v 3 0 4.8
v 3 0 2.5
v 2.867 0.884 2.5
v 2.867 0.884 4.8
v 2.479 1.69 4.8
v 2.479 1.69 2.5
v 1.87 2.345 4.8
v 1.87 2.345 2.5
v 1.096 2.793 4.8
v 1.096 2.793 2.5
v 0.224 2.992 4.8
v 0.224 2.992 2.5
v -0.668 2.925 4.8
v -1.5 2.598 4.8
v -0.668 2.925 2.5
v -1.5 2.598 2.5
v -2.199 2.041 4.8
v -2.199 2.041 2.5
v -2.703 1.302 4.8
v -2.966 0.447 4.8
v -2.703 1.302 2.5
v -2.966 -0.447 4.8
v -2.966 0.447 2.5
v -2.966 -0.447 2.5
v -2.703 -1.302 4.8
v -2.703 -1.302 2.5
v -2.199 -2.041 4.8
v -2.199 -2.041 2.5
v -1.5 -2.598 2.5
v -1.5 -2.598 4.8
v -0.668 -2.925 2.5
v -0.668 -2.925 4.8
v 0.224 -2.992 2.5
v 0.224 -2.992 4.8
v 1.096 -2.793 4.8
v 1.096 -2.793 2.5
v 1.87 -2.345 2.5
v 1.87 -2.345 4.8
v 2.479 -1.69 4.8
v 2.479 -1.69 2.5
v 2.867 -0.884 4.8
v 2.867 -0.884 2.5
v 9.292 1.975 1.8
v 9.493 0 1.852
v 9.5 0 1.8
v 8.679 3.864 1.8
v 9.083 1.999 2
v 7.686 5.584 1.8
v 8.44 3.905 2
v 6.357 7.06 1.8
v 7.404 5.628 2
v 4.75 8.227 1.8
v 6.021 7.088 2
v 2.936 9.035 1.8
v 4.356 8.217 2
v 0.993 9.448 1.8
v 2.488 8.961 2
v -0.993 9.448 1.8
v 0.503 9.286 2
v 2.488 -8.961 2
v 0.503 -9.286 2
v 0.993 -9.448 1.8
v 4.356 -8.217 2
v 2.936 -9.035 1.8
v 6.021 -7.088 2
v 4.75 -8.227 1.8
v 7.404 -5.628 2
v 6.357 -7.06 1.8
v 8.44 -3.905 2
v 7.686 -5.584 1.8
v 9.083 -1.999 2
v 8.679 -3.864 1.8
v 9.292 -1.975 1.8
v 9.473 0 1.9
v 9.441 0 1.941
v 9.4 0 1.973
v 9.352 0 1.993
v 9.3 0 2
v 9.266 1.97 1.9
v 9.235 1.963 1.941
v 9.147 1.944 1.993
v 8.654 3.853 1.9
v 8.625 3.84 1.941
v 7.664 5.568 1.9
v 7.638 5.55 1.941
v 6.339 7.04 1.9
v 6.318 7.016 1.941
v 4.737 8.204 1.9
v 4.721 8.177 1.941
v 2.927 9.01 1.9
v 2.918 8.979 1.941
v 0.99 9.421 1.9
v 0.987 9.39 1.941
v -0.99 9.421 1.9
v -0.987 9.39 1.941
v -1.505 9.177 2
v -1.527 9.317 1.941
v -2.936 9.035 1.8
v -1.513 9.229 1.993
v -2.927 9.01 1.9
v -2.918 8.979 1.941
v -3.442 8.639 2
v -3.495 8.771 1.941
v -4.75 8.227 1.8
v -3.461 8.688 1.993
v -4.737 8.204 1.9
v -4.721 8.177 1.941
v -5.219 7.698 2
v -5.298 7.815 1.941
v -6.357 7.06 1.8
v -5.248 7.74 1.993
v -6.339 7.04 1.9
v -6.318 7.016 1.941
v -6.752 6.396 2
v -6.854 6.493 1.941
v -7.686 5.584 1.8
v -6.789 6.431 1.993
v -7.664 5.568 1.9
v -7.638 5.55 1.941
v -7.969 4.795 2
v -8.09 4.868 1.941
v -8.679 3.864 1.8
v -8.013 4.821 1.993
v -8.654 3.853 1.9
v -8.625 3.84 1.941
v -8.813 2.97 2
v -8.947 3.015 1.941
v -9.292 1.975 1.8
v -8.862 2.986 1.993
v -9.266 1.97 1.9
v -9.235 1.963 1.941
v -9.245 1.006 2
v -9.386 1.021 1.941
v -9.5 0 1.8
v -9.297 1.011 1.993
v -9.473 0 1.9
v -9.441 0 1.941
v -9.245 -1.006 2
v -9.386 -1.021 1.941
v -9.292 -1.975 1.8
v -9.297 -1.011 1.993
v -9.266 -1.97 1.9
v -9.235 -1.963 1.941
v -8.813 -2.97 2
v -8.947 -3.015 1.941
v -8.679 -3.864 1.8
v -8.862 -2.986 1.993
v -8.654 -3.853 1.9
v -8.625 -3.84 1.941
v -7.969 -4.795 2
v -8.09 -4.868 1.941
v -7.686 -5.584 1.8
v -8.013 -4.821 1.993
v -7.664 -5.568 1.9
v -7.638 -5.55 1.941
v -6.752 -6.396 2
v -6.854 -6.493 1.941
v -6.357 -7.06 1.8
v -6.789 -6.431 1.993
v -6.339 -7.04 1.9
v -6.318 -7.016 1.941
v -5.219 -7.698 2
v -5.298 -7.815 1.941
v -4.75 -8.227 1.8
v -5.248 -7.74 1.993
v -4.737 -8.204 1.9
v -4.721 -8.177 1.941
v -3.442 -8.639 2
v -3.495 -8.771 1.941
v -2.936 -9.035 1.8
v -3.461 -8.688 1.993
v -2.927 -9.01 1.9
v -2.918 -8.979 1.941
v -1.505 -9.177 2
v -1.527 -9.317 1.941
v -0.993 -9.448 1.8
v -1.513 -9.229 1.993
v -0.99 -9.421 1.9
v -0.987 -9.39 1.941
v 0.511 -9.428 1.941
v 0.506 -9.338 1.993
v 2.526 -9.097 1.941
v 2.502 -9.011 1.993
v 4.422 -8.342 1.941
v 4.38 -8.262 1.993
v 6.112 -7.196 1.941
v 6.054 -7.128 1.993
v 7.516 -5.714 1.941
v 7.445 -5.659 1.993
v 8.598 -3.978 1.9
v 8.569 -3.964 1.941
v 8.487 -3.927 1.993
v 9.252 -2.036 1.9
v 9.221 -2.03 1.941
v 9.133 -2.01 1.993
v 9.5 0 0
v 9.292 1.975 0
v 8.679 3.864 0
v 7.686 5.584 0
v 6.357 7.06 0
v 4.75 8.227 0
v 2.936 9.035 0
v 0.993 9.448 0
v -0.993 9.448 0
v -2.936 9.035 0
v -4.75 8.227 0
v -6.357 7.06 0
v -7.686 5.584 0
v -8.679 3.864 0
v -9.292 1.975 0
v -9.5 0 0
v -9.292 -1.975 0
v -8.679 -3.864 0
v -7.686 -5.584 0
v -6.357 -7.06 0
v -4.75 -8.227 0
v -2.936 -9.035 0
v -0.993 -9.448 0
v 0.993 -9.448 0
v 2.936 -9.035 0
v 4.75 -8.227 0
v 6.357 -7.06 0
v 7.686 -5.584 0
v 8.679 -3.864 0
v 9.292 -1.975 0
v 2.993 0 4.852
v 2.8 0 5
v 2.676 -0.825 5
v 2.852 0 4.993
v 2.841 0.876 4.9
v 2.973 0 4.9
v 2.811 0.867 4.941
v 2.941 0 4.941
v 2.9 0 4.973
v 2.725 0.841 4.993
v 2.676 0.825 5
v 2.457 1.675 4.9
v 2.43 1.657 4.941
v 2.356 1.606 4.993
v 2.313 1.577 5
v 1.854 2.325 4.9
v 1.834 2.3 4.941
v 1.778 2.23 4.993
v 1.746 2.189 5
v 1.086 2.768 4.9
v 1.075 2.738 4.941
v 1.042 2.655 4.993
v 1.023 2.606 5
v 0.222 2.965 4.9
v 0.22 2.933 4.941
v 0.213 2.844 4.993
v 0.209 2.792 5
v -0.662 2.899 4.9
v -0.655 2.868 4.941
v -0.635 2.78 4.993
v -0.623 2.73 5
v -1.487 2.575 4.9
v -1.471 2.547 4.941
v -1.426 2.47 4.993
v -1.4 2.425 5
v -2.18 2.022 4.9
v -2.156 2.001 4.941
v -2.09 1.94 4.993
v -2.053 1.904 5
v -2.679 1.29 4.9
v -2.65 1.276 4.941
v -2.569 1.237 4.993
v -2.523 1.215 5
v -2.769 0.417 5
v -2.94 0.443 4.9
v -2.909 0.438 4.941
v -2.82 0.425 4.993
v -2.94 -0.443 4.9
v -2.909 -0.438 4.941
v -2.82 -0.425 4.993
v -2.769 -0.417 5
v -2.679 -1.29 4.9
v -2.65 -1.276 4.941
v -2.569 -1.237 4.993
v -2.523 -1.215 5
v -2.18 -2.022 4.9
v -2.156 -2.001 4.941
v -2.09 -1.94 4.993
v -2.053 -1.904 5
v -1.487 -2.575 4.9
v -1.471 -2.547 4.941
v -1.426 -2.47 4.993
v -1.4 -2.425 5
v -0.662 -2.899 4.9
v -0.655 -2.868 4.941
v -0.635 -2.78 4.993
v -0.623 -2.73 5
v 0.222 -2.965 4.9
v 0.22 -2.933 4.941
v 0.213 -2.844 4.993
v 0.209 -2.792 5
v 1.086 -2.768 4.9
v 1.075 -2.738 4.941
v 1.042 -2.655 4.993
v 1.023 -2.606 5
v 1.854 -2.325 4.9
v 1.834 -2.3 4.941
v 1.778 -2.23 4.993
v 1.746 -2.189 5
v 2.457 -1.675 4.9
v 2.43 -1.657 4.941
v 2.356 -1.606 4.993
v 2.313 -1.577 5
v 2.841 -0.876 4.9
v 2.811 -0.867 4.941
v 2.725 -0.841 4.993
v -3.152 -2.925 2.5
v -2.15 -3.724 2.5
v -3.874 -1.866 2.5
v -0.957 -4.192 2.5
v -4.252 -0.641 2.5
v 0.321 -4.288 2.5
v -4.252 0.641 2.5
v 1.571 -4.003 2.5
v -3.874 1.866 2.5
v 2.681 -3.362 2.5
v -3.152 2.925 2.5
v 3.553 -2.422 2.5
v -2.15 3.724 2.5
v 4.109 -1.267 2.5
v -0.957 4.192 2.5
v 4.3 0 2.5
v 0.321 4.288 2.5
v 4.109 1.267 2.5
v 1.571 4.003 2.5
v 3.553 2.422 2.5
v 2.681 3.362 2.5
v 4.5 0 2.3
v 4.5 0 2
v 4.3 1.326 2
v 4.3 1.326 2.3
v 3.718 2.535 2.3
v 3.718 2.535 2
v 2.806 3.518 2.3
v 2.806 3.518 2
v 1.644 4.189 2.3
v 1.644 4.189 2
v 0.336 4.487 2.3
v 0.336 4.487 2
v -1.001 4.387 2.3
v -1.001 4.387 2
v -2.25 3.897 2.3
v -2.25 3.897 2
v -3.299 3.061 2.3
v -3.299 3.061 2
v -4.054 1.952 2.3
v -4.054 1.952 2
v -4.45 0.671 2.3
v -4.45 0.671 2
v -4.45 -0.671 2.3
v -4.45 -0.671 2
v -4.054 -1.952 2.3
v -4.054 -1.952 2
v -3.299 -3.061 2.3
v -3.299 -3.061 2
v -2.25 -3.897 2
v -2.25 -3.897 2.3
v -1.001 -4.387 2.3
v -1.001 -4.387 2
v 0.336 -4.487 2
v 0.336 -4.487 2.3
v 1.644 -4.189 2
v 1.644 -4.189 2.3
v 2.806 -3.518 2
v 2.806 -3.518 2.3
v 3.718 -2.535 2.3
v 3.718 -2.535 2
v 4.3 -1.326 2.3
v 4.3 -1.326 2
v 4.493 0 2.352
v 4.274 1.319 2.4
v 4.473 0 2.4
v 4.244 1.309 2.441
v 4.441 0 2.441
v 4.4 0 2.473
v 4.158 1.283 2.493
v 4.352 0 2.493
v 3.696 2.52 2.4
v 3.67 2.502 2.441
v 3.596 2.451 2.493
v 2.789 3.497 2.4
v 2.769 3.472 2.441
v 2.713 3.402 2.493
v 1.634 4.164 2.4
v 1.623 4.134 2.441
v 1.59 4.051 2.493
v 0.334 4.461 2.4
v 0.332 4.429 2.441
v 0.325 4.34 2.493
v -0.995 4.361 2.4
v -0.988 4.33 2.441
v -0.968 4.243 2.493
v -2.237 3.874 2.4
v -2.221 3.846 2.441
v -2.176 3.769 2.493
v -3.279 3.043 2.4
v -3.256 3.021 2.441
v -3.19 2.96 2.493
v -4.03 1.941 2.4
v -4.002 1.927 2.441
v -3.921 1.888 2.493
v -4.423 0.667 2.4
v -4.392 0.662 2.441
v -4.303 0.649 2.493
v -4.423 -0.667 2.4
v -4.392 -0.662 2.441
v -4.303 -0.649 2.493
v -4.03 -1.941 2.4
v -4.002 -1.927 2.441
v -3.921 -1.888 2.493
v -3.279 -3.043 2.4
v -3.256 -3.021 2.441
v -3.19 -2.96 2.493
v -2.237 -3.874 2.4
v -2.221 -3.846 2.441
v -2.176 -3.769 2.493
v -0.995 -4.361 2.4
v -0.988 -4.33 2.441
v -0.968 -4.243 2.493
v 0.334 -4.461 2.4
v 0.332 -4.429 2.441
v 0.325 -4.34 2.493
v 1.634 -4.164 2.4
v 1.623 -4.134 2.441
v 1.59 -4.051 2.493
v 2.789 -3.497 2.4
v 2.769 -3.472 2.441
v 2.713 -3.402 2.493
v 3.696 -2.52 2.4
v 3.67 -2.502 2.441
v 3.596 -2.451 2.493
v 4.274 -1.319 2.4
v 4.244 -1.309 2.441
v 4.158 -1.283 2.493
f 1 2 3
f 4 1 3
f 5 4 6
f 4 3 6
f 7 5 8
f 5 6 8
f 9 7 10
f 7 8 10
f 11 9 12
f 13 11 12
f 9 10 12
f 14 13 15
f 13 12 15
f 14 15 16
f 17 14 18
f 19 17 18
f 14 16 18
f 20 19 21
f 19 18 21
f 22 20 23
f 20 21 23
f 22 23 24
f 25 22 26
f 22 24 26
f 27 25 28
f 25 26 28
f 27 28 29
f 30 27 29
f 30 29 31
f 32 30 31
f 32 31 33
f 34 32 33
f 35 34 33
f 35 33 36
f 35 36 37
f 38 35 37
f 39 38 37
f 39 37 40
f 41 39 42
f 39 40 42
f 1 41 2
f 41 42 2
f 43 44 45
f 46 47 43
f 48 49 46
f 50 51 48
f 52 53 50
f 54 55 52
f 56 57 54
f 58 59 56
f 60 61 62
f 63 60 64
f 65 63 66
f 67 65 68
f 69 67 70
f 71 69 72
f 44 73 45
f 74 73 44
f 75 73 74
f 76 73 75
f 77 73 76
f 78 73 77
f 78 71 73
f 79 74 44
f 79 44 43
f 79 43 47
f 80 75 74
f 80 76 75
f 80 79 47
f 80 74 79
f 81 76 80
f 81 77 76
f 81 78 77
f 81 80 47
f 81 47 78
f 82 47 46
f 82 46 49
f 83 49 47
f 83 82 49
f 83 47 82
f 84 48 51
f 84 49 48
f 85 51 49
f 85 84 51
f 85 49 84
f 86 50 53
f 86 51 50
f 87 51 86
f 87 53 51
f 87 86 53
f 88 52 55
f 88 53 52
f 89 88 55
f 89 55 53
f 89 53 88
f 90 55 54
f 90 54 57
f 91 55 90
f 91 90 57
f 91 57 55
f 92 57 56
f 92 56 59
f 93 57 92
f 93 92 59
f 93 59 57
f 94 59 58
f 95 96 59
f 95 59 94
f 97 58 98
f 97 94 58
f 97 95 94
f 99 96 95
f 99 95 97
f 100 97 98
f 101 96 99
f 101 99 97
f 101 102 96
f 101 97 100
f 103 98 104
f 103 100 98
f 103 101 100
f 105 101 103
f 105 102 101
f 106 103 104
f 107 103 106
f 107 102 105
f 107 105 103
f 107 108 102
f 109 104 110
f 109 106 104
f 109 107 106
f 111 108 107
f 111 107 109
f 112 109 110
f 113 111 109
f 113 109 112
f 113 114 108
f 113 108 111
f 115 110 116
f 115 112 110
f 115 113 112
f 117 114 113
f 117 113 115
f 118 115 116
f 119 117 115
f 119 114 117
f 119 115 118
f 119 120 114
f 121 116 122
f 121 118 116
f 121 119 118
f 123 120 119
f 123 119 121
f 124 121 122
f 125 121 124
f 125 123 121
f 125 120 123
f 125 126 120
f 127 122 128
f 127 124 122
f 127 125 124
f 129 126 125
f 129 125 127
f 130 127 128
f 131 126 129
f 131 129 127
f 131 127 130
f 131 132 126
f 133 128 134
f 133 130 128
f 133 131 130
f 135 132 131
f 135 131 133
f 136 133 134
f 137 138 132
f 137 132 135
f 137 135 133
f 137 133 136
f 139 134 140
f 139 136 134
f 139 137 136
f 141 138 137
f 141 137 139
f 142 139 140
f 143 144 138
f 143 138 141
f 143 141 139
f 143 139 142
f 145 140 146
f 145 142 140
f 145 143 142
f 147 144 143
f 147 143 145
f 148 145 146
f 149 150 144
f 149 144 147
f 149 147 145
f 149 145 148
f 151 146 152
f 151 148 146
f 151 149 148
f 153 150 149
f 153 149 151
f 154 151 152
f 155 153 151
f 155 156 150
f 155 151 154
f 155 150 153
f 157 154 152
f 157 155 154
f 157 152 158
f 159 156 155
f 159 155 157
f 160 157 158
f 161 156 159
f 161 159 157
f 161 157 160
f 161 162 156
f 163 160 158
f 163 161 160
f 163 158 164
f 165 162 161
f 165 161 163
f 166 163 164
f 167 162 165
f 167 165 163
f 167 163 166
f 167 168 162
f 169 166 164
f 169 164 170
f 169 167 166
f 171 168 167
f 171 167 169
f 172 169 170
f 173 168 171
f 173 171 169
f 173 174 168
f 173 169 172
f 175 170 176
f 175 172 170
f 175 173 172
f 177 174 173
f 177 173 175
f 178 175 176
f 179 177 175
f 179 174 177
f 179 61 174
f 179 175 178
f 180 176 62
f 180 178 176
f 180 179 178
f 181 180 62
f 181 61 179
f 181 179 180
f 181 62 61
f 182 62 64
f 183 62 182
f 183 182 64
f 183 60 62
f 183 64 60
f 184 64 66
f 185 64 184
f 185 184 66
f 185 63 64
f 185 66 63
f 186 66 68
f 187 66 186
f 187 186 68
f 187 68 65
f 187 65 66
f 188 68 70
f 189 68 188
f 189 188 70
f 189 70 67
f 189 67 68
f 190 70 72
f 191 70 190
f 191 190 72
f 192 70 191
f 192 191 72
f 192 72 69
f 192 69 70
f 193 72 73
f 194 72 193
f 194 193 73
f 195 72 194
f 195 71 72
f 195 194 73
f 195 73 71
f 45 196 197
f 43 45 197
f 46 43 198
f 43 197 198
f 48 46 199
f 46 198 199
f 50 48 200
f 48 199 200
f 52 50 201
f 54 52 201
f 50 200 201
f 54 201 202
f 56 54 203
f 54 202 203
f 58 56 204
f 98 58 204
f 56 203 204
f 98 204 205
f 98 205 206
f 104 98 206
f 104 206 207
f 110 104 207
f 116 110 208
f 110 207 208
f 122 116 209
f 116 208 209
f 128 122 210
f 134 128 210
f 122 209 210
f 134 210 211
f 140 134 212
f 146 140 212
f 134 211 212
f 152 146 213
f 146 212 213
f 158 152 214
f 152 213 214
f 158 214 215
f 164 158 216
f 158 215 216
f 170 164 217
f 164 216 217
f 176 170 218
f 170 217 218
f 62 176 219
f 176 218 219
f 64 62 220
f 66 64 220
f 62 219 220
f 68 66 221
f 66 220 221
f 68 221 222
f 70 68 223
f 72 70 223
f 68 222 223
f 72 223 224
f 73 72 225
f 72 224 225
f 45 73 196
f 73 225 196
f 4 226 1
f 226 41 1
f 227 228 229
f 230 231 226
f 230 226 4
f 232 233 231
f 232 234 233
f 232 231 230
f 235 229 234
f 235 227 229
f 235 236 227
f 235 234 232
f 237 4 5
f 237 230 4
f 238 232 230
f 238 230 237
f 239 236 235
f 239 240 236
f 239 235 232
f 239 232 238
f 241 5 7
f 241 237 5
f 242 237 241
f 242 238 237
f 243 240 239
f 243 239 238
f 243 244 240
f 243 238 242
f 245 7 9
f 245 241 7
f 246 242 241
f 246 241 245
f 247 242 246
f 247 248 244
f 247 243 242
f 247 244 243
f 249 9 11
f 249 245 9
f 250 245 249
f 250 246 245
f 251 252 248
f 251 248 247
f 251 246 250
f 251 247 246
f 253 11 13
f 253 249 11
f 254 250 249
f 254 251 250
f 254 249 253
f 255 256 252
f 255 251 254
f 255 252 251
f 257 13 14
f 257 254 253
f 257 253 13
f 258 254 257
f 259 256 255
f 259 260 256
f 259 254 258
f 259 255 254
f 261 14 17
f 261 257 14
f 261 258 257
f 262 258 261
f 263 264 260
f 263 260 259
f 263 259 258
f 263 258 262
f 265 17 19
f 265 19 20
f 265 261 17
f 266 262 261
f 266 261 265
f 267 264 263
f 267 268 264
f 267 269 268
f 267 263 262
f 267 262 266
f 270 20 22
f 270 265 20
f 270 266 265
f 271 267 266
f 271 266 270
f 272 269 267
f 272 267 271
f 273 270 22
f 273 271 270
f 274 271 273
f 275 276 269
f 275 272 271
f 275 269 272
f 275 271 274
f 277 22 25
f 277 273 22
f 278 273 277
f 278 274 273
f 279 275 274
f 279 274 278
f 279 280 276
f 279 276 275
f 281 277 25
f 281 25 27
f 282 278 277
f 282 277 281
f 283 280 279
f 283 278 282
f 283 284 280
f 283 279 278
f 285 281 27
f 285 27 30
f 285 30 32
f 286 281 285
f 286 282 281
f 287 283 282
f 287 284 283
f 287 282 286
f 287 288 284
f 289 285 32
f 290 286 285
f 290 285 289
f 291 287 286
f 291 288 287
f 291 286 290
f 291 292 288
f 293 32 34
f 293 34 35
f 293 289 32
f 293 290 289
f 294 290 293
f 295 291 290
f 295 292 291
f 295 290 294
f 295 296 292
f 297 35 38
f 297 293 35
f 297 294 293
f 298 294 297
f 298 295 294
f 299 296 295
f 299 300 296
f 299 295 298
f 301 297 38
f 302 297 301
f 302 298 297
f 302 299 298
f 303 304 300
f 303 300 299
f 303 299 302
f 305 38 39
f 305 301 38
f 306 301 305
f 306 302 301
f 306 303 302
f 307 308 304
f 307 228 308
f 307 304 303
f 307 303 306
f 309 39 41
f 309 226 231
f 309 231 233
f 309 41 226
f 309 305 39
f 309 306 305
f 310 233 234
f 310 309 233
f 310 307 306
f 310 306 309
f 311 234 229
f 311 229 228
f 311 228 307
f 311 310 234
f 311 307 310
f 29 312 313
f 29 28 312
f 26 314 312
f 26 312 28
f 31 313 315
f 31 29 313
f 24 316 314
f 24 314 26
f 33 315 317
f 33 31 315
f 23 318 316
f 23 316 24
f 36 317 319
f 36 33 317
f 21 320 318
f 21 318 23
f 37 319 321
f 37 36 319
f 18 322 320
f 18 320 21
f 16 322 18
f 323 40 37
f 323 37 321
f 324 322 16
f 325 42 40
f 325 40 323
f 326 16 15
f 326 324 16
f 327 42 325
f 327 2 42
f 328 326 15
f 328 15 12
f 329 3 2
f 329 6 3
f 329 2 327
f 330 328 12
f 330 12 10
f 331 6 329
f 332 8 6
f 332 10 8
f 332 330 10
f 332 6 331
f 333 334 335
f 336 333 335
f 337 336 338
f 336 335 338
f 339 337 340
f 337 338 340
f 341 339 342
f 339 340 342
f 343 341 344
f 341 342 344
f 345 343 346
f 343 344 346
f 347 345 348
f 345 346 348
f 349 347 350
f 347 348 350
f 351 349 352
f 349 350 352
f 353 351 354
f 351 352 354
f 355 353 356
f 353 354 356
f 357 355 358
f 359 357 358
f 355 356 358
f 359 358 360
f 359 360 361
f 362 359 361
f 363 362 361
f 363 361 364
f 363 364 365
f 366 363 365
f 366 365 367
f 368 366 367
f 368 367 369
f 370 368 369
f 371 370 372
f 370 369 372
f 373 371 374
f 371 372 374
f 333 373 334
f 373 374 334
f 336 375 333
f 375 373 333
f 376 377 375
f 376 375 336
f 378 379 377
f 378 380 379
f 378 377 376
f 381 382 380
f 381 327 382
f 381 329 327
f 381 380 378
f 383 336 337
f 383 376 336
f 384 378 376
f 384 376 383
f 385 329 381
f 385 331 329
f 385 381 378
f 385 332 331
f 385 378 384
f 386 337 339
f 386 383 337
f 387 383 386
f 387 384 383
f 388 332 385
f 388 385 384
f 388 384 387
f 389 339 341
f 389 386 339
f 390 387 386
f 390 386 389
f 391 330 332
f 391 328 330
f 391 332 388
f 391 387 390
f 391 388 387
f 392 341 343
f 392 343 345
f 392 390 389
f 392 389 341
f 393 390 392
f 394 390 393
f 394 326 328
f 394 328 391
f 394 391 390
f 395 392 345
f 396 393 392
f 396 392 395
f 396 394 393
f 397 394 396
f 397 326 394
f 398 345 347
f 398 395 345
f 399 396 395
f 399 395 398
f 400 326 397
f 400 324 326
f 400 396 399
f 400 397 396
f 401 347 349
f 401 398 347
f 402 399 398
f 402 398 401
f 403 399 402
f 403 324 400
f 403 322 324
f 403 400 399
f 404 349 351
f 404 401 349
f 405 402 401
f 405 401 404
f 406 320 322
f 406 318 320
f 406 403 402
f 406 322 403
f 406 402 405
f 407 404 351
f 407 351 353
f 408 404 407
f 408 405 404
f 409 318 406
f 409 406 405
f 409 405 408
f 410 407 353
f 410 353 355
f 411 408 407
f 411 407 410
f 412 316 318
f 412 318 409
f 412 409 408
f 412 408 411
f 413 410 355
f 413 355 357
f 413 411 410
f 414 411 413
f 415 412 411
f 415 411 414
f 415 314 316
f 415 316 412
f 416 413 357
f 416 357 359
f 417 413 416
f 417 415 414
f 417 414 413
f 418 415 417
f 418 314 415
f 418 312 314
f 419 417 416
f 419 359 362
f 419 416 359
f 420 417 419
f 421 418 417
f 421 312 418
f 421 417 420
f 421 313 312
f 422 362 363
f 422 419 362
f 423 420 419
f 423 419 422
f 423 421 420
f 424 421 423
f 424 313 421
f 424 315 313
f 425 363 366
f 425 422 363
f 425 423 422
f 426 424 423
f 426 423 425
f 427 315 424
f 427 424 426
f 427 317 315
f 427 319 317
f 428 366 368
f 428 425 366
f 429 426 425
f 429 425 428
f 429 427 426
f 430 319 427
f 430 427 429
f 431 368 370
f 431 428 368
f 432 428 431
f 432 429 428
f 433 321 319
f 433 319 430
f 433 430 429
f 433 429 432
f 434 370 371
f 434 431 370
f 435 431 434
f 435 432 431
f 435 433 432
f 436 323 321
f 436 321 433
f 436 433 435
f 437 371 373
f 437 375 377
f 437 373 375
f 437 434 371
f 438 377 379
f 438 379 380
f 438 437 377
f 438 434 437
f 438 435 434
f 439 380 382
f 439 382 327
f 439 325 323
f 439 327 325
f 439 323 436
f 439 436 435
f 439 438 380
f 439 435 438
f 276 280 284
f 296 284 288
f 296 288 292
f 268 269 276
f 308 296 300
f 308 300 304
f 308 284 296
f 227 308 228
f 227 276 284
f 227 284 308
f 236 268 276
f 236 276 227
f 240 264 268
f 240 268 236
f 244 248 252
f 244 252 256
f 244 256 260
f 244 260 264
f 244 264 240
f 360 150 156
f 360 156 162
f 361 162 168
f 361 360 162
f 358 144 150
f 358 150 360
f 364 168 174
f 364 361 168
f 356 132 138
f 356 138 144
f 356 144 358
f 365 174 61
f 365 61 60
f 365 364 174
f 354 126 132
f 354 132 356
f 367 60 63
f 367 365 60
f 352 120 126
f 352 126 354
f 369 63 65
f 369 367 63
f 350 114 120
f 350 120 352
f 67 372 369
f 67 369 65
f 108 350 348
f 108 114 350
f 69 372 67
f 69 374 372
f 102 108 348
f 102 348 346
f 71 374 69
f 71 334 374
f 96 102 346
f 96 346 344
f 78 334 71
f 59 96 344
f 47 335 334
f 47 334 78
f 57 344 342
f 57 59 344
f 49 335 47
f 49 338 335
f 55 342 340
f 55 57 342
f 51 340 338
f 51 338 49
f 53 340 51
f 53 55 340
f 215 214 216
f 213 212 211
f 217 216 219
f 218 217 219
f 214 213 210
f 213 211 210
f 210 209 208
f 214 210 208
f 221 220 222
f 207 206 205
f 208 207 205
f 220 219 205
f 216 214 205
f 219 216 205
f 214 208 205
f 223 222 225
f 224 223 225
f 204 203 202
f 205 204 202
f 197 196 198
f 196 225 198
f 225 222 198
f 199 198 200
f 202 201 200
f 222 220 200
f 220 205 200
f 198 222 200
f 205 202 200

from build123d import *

# Parameters (mm, degrees)
F0_R     = 9.5
F1_DEPTH = 2
F2_R     = 4.5
F3_DEPTH = 0.5
F4_R     = 3
F5_DEPTH = 2.5
F6_R     = 0.2


with BuildPart() as f1:
    # F0 (on Top) → F1 (new body)
    with BuildSketch(Plane.XY):
        Circle(F0_R)
    extrude(amount=F1_DEPTH)

    # F2 (on face) → F3 (join)
    with BuildSketch(Plane.XY.offset(2)):
        Circle(F2_R)
    extrude(amount=F3_DEPTH)

    # F4 (on face) → F5 (join)
    with BuildSketch(Plane.XY.offset(2.5)):
        Circle(F4_R)
    extrude(amount=F5_DEPTH)

    # F6
    f6_edges = [f1.edges().sort_by_distance(p)[0] for p in [
        (-3, 0, 5),
        (-4.5, 0, 2.5),
        (-9.5, 0, 2),
    ]]
    fillet(f6_edges, radius=F6_R)


solid = f1.part
